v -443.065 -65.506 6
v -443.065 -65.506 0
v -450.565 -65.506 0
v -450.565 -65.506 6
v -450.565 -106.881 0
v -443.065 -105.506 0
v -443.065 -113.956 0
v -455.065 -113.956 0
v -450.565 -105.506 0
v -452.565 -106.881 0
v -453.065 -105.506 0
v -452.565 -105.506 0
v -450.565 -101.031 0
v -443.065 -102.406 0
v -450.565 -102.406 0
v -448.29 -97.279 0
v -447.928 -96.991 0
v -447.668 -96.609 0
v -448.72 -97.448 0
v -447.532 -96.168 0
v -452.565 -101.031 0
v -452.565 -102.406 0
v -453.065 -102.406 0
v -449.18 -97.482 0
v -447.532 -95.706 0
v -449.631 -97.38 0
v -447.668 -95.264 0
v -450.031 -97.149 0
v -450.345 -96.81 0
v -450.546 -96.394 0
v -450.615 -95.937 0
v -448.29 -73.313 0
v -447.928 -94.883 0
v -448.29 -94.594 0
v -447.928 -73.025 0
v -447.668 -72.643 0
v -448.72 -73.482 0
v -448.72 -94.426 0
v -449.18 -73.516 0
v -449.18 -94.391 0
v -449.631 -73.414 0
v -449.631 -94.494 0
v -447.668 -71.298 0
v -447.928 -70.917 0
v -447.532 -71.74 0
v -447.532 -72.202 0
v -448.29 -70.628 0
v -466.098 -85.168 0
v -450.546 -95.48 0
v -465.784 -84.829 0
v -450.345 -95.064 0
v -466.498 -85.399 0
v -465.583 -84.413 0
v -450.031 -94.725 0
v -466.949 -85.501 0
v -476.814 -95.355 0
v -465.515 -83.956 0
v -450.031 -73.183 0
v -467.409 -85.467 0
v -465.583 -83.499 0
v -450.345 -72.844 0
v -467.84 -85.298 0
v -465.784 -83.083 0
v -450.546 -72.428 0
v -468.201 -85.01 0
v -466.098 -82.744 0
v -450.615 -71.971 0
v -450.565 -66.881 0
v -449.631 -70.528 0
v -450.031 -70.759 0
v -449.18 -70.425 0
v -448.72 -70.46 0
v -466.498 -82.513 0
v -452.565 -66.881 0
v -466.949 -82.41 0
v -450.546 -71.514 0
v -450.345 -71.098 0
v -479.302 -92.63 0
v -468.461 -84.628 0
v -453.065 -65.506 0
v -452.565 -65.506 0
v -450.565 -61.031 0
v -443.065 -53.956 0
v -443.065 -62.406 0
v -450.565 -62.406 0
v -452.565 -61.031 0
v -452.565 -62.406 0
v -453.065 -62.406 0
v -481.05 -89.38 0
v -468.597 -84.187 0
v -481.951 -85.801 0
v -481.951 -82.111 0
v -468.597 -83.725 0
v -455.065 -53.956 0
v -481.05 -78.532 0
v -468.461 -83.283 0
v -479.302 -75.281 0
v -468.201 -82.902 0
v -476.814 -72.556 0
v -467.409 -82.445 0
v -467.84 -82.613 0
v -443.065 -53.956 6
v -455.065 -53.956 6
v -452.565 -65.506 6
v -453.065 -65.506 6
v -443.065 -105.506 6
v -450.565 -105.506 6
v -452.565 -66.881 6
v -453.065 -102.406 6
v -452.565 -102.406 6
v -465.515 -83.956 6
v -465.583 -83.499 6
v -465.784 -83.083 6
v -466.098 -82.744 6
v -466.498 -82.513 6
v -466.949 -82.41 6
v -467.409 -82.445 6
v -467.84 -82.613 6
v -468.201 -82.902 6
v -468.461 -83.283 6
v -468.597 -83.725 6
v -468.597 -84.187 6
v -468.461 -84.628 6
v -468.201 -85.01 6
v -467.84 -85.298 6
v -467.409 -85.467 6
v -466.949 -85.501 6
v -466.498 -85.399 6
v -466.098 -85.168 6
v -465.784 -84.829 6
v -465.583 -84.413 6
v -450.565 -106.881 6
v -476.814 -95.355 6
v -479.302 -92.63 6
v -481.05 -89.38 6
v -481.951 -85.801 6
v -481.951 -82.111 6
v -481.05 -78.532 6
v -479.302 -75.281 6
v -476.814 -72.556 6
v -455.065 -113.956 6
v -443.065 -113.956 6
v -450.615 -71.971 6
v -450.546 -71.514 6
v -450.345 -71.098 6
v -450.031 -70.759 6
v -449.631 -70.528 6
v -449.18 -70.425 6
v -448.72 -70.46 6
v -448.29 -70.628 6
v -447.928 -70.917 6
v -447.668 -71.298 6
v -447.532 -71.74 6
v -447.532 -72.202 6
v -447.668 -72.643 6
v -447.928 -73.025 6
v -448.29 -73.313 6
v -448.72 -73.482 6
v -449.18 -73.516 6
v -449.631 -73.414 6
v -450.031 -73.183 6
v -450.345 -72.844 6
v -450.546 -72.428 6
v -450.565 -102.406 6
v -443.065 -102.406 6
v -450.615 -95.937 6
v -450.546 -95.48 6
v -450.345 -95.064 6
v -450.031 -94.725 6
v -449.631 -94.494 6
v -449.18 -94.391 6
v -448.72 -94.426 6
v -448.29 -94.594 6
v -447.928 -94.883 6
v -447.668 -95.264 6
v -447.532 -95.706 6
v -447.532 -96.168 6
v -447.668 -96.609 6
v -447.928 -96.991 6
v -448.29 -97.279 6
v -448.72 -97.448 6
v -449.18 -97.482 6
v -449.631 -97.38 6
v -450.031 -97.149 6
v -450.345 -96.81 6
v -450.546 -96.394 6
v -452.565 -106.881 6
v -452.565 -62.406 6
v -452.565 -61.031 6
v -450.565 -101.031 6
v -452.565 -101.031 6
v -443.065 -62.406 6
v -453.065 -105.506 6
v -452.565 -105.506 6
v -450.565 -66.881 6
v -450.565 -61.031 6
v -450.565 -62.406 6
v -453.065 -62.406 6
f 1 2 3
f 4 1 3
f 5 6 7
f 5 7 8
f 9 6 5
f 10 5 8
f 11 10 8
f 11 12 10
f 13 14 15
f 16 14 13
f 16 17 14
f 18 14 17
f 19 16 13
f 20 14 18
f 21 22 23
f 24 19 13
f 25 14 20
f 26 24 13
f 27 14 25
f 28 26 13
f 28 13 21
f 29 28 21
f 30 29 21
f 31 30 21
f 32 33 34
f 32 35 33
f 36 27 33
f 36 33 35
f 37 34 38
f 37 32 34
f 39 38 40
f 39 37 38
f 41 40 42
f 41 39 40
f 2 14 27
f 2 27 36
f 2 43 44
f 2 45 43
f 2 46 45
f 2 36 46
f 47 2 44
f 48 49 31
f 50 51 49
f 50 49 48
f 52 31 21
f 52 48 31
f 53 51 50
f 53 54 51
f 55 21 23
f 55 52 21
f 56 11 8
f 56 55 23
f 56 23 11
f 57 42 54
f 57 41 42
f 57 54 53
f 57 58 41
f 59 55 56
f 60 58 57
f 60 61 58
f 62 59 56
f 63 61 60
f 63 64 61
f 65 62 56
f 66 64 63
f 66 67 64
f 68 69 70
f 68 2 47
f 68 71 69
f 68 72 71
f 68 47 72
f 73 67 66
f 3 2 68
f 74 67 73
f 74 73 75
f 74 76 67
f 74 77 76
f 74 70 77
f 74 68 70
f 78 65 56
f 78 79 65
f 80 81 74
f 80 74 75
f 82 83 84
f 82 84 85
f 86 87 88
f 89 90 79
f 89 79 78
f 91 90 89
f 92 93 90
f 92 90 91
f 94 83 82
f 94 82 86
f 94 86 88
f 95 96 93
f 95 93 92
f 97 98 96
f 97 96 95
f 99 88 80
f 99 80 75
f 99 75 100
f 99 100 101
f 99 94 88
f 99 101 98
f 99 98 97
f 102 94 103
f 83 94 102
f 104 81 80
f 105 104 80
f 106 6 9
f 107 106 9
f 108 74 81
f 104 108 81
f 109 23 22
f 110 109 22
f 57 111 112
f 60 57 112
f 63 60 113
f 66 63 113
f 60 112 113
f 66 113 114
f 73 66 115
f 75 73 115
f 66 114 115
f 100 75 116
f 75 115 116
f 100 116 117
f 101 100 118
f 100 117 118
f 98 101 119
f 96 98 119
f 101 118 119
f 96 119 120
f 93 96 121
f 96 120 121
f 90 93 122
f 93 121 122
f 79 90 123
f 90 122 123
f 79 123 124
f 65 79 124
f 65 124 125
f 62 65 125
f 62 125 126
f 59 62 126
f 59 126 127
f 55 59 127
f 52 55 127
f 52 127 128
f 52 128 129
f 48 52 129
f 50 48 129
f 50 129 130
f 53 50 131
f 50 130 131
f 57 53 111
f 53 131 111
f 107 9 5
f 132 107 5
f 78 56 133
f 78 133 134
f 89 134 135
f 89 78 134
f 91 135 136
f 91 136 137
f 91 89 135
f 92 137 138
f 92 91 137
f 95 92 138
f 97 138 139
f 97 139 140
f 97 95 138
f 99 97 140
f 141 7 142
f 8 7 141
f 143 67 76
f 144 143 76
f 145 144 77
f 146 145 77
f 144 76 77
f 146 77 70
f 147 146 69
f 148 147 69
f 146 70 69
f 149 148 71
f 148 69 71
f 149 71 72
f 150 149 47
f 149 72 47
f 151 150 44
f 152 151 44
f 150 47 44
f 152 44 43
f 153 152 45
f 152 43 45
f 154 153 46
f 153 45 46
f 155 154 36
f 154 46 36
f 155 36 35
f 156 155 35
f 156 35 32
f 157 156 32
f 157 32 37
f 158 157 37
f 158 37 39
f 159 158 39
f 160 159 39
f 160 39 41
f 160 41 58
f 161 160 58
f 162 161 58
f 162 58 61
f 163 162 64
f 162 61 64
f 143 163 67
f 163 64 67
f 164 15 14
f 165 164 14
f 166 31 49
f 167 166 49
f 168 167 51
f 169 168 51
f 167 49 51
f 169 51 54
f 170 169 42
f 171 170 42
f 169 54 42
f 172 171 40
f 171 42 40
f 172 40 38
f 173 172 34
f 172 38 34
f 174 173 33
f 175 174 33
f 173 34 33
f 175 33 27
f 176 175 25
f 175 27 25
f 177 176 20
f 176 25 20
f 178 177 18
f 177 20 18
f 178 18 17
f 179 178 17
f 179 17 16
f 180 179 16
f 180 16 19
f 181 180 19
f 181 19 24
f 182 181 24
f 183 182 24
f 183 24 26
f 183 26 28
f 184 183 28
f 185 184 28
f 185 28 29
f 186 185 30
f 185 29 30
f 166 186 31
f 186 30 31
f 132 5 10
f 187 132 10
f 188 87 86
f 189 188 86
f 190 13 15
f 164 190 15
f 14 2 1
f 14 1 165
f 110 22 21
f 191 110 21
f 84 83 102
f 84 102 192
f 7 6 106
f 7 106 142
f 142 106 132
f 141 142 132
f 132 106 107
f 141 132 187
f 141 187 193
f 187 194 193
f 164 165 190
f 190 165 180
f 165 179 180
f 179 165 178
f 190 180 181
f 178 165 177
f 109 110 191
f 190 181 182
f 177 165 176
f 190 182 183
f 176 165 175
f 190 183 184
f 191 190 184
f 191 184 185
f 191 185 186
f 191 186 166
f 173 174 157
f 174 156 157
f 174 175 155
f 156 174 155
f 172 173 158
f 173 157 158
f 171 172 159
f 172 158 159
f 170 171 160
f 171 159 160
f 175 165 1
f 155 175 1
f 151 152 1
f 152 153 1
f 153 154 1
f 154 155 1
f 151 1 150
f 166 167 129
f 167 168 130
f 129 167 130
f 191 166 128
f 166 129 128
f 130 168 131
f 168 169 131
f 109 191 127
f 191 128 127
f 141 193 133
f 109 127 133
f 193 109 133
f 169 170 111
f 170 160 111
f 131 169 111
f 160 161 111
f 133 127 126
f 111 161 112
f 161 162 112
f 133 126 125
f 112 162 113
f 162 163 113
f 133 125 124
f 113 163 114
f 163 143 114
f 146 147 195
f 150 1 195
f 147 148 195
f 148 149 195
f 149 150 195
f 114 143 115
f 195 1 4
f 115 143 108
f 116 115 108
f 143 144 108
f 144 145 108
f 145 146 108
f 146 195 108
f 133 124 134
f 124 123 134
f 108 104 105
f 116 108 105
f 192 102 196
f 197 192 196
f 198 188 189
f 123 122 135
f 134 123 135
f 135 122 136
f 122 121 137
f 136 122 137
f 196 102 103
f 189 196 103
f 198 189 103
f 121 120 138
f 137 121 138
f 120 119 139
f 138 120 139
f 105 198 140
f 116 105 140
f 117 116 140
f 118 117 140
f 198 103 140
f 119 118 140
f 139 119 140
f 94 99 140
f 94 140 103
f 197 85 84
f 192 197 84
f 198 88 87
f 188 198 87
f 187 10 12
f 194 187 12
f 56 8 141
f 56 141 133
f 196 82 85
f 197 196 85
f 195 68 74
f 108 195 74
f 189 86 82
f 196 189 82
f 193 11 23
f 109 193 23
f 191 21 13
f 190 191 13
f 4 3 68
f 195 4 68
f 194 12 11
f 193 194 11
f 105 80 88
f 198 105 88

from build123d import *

# Parameters (mm, degrees)
DODANIE_WYCI_GNI_CIE1_DEPTH = 6
SZKIC2_R                    = 1.55
WYTNIJ_WYCI_GNI_CIE1_DEPTH  = 6
WYTNIJ_WYCI_GNI_CIE2_DEPTH  = 6
SZYK_LINIOWY1_COUNT         = 2
SZYK_LINIOWY1_PITCH         = 40
SZKIC4_R                    = 1.55
WYTNIJ_WYCI_GNI_CIE3_DEPTH  = 6


with BuildPart() as part:
    # Szkic1 → Dodanie-wyciągnięcie1 (new body)
    with BuildSketch(Plane.XY):
        with BuildLine():
            Line((-455.064585695, -113.955768861), (-476.813799507, -95.355454386))
            ThreePointArc((-476.813799507, -95.355454386), (-482.064585695, -83.955768861), (-476.813799507, -72.556083337))
            Line((-476.813799507, -72.556083337), (-455.064585695, -53.955768861))
            Line((-455.064585695, -53.955768861), (-443.064585695, -53.955768861))
            Line((-443.064585695, -53.955768861), (-443.064585695, -113.955768861))
            Line((-443.064585695, -113.955768861), (-455.064585695, -113.955768861))
        make_face()
    extrude(amount=DODANIE_WYCI_GNI_CIE1_DEPTH)

    # Szkic2 → Wytnij-wyciągnięcie1 (cut)
    with BuildSketch(Plane.XY.offset(6)):
        with Locations((-467.064585695, -83.955768861)):
            Circle(SZKIC2_R)
    extrude(amount=-WYTNIJ_WYCI_GNI_CIE1_DEPTH, mode=Mode.SUBTRACT)

    # Szkic3 → Wytnij-wyciągnięcie2 (cut)
    with BuildSketch(Plane(origin=(0, 0, 0), x_dir=(-1, 0, 0), z_dir=(0, 0, -1))):
        Polygon((443.064585695, -105.505768861), (450.564585695, -105.505768861), (450.564585695, -106.880768861), (452.564585695, -106.880768861), (452.564585695, -105.505768861), (453.064585695, -105.505768861), (453.064585695, -102.405768861), (452.564585695, -102.405768861), (452.564585695, -101.030768861), (450.564585695, -101.030768861), (450.564585695, -102.405768861), (443.064585695, -102.405768861), align=None)
    wytnij_wyci_gni_cie2 = extrude(amount=-WYTNIJ_WYCI_GNI_CIE2_DEPTH, mode=Mode.SUBTRACT)

    # Szyk liniowy1: Wytnij-wyciągnięcie2 ×2
    with Locations(*[(0, i * SZYK_LINIOWY1_PITCH, 0) for i in range(1, SZYK_LINIOWY1_COUNT)]):
        add(wytnij_wyci_gni_cie2, mode=Mode.SUBTRACT)

    # Szkic4 → Wytnij-wyciągnięcie3 (cut)
    with BuildSketch(Plane(origin=(0, 0, 0), x_dir=(-1, 0, 0), z_dir=(0, 0, -1))):
        with Locations((449.064585017, -95.936775964)):
            Circle(SZKIC4_R)
        with Locations((449.064585017, -71.970769345)):
            Circle(SZKIC4_R)
    extrude(amount=-WYTNIJ_WYCI_GNI_CIE3_DEPTH, mode=Mode.SUBTRACT)


solid = part.part
